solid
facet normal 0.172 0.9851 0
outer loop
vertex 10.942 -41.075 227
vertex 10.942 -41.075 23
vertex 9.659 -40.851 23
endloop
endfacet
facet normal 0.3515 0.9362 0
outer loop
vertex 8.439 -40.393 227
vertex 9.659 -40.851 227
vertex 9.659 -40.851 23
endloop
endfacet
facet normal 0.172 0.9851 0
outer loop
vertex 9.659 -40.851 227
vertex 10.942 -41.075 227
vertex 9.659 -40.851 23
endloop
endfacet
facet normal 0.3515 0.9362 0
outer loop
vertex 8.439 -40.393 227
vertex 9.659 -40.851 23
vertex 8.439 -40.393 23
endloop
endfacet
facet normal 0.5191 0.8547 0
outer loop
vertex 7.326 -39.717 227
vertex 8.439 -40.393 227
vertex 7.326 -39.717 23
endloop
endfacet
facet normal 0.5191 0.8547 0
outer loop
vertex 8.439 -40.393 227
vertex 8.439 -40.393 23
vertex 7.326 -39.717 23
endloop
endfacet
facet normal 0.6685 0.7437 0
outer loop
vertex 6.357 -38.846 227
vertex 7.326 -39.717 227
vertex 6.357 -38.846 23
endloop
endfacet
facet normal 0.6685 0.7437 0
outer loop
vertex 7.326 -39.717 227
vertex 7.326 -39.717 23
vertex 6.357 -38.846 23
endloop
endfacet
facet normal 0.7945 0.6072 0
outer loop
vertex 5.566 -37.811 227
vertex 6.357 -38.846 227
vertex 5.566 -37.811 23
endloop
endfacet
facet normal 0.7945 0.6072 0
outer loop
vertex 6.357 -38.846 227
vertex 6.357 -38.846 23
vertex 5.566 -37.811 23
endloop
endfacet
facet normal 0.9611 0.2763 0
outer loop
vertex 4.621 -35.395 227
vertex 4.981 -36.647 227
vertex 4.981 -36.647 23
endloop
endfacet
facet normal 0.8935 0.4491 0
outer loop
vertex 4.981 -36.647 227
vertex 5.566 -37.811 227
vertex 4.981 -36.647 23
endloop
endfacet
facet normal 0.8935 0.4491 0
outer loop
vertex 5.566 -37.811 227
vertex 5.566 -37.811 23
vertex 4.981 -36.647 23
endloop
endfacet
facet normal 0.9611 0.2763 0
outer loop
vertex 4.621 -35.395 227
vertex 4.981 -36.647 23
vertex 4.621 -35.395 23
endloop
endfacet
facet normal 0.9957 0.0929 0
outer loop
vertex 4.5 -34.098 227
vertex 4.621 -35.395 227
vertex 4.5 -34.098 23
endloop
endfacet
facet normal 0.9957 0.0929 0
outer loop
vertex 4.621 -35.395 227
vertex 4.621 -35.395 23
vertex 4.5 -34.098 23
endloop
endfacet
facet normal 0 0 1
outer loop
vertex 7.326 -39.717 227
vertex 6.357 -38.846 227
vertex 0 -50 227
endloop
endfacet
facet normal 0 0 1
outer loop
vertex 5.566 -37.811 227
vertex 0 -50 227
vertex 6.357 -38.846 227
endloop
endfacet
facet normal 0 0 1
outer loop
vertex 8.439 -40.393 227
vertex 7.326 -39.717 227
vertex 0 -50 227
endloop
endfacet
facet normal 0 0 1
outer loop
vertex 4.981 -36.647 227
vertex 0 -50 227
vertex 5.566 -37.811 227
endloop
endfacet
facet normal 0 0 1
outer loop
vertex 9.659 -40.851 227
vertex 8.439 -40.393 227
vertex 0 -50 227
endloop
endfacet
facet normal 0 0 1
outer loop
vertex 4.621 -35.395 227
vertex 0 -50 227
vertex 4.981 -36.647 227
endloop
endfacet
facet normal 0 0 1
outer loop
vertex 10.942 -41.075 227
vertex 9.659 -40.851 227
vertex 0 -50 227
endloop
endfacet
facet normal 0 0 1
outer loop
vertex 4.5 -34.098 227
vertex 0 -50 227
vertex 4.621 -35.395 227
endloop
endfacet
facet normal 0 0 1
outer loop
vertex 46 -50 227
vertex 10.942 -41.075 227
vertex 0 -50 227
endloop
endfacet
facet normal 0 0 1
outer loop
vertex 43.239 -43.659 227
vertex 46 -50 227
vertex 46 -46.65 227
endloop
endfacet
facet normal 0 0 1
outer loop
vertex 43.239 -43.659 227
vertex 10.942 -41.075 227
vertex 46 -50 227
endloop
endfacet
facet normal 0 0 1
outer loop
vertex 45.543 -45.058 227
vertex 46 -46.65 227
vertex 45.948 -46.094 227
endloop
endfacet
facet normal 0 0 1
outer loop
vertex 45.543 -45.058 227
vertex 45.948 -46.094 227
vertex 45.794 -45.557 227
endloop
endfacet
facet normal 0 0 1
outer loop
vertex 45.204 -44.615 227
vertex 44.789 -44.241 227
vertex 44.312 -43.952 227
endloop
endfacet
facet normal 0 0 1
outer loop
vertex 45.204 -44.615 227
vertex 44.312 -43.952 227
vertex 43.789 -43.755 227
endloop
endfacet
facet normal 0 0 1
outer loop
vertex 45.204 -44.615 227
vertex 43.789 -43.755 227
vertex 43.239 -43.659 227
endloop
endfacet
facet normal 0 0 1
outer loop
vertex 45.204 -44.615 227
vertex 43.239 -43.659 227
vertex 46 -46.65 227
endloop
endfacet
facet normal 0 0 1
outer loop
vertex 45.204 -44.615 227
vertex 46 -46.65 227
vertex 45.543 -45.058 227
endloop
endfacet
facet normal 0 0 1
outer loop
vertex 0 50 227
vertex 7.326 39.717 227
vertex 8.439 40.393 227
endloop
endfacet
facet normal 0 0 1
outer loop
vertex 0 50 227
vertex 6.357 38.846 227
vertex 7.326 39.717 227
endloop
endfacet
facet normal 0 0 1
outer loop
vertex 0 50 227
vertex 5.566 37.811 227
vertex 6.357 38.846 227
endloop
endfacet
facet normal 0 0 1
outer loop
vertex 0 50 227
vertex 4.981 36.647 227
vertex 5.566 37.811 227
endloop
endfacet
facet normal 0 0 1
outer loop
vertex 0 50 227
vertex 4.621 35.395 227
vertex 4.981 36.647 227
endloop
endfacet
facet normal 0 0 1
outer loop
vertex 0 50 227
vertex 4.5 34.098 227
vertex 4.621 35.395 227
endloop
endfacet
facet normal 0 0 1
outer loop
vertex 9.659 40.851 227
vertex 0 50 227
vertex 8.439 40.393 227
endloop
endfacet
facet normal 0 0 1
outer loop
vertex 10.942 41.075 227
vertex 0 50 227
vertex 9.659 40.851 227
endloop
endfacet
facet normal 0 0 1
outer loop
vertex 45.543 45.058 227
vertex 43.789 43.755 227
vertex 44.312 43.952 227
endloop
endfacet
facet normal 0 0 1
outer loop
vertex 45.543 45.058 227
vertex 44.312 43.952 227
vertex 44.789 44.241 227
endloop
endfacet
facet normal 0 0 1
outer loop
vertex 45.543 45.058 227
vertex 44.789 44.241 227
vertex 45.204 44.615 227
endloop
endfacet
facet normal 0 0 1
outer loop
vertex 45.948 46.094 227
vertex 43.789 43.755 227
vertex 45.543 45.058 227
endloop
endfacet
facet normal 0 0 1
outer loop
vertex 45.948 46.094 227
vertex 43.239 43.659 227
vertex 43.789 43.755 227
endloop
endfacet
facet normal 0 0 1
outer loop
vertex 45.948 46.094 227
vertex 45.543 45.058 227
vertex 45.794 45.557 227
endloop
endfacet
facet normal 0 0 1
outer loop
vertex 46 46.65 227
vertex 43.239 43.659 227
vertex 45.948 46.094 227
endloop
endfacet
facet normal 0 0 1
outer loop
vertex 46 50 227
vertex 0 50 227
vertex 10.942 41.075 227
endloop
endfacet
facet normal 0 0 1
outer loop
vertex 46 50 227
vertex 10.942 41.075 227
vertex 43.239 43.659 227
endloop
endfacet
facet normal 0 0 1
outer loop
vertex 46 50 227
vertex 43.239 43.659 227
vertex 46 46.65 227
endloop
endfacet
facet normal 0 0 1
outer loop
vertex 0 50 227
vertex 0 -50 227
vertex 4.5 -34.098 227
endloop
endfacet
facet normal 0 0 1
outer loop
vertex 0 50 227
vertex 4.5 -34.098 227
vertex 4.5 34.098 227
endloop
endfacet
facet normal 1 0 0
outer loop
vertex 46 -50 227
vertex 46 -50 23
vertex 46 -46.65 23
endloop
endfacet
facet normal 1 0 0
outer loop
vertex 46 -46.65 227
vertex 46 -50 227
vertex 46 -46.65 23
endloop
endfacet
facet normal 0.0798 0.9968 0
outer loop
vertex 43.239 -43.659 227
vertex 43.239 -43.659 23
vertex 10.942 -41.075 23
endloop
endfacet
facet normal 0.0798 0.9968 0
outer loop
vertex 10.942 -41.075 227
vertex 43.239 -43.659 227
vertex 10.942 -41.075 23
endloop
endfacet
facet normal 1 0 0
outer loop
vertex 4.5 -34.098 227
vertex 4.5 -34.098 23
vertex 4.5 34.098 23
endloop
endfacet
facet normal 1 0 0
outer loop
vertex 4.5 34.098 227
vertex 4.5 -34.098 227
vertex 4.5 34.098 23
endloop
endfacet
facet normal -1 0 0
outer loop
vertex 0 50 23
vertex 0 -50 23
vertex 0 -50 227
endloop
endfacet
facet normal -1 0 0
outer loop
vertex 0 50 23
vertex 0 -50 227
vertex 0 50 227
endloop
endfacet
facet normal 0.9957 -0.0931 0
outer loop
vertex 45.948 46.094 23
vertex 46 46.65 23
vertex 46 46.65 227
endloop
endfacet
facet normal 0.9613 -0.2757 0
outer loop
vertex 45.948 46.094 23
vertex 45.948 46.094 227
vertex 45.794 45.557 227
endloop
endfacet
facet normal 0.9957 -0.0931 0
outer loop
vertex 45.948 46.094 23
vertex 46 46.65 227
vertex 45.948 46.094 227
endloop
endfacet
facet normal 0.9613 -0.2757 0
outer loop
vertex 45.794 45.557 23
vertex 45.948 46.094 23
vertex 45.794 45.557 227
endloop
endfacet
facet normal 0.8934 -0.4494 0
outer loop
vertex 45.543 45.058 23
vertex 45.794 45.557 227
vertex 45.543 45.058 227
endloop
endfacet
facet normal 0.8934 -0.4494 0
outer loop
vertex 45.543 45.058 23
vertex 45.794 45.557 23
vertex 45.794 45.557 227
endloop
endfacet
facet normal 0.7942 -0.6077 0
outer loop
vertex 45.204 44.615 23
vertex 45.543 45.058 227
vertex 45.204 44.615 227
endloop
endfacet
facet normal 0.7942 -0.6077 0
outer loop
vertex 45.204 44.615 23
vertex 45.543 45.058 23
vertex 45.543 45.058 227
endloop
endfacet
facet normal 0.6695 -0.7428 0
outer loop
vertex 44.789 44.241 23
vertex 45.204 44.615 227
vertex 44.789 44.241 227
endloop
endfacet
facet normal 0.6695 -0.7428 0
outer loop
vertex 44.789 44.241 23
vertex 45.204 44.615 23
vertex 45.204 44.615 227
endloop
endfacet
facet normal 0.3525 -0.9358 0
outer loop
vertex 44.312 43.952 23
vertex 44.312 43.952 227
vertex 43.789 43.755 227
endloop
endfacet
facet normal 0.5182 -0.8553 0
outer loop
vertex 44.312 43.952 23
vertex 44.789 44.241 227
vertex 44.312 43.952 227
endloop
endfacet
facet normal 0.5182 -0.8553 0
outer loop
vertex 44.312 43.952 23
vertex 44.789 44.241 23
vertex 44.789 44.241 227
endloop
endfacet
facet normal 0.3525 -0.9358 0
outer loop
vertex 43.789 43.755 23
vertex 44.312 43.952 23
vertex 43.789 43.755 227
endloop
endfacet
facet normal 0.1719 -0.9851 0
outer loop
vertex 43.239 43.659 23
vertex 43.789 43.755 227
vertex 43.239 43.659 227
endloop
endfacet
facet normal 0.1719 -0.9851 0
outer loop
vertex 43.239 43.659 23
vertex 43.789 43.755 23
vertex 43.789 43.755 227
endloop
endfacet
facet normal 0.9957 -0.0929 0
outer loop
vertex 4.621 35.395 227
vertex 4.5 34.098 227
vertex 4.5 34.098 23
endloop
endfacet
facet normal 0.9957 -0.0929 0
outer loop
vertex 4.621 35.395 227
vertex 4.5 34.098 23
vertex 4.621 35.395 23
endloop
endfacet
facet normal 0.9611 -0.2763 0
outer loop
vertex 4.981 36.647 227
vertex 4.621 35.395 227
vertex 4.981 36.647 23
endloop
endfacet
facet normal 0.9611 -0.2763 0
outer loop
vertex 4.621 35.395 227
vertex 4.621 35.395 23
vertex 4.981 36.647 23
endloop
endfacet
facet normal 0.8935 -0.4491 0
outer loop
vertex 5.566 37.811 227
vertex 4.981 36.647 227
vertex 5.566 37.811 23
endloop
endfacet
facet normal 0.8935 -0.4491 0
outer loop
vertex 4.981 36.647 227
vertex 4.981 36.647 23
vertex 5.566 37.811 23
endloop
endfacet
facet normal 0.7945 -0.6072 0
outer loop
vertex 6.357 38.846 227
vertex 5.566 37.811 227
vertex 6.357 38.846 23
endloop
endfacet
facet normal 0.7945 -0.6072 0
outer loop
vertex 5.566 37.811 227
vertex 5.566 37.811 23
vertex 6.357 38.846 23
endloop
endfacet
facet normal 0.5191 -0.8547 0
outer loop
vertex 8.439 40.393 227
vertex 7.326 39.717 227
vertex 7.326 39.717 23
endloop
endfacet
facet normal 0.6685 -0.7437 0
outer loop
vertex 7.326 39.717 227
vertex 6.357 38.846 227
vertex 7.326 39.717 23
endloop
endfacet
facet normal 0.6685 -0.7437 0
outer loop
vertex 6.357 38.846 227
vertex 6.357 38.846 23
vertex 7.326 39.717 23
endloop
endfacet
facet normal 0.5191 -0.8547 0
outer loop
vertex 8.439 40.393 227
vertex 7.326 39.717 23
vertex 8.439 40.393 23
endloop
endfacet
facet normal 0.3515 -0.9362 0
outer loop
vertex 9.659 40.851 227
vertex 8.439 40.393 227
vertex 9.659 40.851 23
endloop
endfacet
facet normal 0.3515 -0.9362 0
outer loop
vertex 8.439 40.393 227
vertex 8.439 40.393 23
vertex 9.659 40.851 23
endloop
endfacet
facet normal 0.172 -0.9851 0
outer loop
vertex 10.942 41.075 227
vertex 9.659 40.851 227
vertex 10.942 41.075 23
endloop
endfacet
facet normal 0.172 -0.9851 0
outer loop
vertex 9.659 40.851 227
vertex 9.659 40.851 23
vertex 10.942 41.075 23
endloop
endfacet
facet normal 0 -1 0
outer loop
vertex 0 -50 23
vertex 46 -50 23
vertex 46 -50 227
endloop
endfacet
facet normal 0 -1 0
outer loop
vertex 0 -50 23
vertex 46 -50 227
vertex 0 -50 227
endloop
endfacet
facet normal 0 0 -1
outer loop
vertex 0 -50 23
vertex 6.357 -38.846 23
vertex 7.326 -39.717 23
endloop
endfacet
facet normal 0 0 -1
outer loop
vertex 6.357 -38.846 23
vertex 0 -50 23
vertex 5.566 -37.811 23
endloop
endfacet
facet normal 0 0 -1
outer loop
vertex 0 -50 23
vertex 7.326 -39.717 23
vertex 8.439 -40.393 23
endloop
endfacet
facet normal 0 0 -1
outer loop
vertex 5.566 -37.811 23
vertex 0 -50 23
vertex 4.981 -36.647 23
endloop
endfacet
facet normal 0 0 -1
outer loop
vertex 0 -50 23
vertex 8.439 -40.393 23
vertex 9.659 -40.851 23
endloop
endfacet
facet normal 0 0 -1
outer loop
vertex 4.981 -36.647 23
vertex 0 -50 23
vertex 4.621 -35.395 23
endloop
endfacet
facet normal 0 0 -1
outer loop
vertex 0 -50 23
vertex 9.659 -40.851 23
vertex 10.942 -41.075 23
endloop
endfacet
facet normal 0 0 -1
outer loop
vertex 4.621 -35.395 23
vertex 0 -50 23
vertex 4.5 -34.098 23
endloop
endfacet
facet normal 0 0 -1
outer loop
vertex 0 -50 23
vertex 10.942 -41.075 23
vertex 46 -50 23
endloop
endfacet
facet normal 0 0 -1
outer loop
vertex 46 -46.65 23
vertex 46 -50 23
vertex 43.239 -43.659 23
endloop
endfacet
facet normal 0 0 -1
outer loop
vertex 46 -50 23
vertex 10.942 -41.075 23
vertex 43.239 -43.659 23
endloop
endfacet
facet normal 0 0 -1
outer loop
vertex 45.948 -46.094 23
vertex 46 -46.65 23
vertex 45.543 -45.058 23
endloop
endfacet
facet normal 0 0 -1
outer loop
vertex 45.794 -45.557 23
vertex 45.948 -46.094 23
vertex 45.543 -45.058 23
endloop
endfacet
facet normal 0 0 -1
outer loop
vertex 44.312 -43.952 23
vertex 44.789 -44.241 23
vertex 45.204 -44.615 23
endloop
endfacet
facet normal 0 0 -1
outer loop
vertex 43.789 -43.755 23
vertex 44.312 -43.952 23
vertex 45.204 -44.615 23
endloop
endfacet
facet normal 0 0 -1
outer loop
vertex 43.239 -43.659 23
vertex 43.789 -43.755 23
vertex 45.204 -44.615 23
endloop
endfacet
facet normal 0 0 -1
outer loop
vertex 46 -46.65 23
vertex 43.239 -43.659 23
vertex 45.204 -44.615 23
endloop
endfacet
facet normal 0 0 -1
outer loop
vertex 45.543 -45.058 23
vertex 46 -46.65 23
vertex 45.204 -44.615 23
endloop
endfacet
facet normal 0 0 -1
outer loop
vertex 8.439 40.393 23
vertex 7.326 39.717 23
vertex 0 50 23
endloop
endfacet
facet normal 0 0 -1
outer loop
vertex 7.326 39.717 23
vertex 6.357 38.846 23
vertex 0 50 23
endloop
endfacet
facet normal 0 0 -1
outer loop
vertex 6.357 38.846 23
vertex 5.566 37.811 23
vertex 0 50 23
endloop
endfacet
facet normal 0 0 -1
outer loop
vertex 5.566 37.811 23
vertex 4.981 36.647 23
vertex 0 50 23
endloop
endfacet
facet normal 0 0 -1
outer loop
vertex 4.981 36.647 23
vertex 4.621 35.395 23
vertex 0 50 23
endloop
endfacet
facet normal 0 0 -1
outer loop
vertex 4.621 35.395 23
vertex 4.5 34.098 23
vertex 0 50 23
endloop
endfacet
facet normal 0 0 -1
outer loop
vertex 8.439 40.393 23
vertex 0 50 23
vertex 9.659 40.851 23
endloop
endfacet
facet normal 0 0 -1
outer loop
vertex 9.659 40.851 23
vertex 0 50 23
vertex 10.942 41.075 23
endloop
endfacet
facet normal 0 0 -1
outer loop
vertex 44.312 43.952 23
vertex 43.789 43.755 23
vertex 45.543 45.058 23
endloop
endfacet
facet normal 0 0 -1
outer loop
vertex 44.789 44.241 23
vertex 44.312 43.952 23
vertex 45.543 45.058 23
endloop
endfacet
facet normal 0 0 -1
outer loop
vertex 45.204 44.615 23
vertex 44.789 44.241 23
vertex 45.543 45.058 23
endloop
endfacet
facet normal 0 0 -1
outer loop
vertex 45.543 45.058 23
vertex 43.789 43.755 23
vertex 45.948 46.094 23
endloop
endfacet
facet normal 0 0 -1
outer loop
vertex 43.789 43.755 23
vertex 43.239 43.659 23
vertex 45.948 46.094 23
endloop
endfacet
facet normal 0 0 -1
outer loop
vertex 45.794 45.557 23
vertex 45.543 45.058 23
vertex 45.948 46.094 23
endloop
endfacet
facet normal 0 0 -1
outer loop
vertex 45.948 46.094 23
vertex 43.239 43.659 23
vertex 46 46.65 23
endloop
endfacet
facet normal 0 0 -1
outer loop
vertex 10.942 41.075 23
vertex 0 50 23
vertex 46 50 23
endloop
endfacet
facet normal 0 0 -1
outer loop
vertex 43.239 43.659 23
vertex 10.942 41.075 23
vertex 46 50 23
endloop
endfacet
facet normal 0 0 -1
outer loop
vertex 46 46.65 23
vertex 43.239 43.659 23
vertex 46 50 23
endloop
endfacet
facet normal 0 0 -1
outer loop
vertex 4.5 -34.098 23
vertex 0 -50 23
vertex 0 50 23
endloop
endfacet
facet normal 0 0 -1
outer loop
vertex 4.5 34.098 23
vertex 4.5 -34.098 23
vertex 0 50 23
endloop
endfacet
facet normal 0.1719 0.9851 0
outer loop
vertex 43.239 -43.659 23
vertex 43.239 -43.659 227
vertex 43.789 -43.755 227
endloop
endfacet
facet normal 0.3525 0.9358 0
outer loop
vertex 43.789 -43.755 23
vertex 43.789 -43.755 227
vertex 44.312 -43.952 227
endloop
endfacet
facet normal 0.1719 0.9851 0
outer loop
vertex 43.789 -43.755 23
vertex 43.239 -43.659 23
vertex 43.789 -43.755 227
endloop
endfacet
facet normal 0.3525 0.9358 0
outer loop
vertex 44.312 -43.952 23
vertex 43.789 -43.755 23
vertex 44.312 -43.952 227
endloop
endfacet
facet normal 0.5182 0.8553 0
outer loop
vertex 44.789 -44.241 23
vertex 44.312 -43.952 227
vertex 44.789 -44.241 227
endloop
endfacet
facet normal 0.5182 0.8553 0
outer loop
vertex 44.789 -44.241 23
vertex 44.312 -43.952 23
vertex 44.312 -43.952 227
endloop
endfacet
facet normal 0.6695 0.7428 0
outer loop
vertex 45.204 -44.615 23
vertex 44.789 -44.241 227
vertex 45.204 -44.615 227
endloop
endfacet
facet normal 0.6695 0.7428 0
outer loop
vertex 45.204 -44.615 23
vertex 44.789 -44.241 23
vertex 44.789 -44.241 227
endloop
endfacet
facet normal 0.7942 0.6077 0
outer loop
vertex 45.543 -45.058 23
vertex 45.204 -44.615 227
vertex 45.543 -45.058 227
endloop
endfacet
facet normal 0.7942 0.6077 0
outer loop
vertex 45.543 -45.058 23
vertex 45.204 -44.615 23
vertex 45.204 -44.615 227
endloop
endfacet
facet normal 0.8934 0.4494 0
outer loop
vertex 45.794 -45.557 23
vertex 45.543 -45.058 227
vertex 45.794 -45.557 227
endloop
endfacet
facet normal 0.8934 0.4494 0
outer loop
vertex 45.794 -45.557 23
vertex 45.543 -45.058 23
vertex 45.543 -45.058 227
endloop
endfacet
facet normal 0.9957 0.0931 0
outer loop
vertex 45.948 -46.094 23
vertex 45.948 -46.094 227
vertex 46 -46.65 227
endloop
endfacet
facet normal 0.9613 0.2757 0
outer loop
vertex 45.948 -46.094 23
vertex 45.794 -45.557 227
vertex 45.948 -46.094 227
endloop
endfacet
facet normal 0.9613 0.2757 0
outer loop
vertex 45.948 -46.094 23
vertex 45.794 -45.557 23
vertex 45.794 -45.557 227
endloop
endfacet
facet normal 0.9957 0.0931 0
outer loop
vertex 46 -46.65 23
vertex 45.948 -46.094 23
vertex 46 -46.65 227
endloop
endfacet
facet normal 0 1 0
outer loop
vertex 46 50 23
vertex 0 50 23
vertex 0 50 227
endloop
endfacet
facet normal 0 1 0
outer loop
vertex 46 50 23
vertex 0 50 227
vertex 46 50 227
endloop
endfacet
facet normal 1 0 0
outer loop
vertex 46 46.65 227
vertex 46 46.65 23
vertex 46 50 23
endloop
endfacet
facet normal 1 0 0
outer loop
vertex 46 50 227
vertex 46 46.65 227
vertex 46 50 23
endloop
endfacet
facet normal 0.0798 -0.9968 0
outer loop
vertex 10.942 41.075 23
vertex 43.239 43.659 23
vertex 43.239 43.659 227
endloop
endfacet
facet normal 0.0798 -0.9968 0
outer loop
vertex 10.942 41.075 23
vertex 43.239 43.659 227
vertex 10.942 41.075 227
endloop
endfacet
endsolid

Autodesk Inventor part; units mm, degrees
ref_plane "Начальная плоскость" through (0, 0, 23) normal (0, 0, 1) x (1, 0, 0)
ref_plane "Конечная плоскость" through (0, 0, 227) normal (0, 0, 1) x (1, 0, 0)
sketch "Эскиз" plane through (0, 0, 0) normal (0, 0, 1) x (1, 0, 0)
  line L0 (46, -50) -> (0, -50)
  line L1 (46, -50) -> (46, -46.6496)
  line L2 (43.2392, -43.6591) -> (10.9418, -41.0753)
  line L3 (4.5, -34.0976) -> (4.5, 34.0976)
  line L4 (43.2392, 43.6591) -> (10.9418, 41.0753)
  line L5 (46, 46.6496) -> (46, 50)
  line L6 (0, 50) -> (46, 50)
  line L7 (0, -50) -> (0, 50)
  arc A0 (4.5, -34.0976) -> (10.9418, -41.0753) centre (11.5, -34.0976) ccw
  arc A1 (10.9418, 41.0753) -> (4.5, 34.0976) centre (11.5, 34.0976) ccw
  arc A2 (46, -46.6496) -> (43.2392, -43.6591) centre (43, -46.6496) ccw
  arc A3 (43.2392, 43.6591) -> (46, 46.6496) centre (43, 46.6496) ccw
  line L8 (0, 70) -> (0, -70) construction
  line L9 (-9.3169, 0) -> (55.9016, 0) construction
  point P0 (46, -43.88)
  point P1 (4.5, -40.56)
  point P2 (4.5, 40.56)
  point P3 (46, 43.88)
  dimension "d3" = 46
  dimension "d5" = 4.5
  dimension "d7" = 100
  dimension "d9" = 9.44
  dimension "d11" = 9.44
  dimension "d13" = 6.12
  dimension "d15" = 6.12
  dimension "d22" = 7
  dimension "d23" = 3
  dimension "d24" = 50
  dimension "d25" = 0
extrude "Тело" add sketch "Эскиз" along normal up to surface (204 mm away) from surface at 23
sketch "Sketch3" plane through (0, 0, 0) normal (0, 0, 1) x (1, 0, 0)
  line L0 (0, 0) -> (10, 0)
ref_plane "Work Plane7" through (0, 0, 0) normal (0, -1, 0) x (1, 0, 0)
sketch "Sketch4" plane through (0, 0, 0) normal (0, -1, 0) x (1, 0, 0)
  line L0 (-2, 23) -> (12, 23)
  line L1 (-2, 227) -> (12, 227)
  dimension "d29" = 204
ref_plane "РабПлоскость8" through (-82, -50, 23) normal (0, 0, -1) x (-1, 0, 0)
split "Разделение1" plane through (-82, -50, 23) removes the side toward (0, 0, -1)
ref_plane "РабПлоскость9" through (368, -50, 227) normal (0, 0, 1) x (1, 0, 0)
split "Разделение2" plane through (368, -50, 227) removes the side toward (0, 0, 1)
equation "\"d3\" = b"
equation "\"d5\" = t1"
equation "\"d7\" = ParH"
equation "\"d9\" = msp_x1 + t2"
equation "\"d11\" = msp_x1 + t2"
equation "\"d13\" = -msp_x2 + t2"
equation "\"d15\" = -msp_x2 + t2"
equation "\"d22\" = R"
equation "\"d23\" = R1"
equation "\"d24\" = 0.5 * d7"
equation "\"d16\" = G_L"
equation "\"R1\" = 3"
equation "\"R\" = 7"
equation "\"t1\" = 4.5"
equation "\"t2\" = 7.6"
equation "\"ParH\" = 100"
equation "\"b\" = 46"
equation "\"msp_x1\" = 0.04 * b"
equation "\"msp_x2\" = -0.08 * t1 + 0.04 * b"
equation "\"G_L\" = d29"
equation "\"ex\" = 0"
equation "\"G_OFFSET_START\" = -23"
equation "\"G_OFFSET_END\" = -23"
equation "\"d26\" = -G_OFFSET_START"
equation "\"d27\" = G_OFFSET_END + B_L"
equation "\"B_L\" = 250"
properties part number "Швеллер 10U-204 ГОСТ 8240-97" material "Сталь, мягкая, сварочная"
